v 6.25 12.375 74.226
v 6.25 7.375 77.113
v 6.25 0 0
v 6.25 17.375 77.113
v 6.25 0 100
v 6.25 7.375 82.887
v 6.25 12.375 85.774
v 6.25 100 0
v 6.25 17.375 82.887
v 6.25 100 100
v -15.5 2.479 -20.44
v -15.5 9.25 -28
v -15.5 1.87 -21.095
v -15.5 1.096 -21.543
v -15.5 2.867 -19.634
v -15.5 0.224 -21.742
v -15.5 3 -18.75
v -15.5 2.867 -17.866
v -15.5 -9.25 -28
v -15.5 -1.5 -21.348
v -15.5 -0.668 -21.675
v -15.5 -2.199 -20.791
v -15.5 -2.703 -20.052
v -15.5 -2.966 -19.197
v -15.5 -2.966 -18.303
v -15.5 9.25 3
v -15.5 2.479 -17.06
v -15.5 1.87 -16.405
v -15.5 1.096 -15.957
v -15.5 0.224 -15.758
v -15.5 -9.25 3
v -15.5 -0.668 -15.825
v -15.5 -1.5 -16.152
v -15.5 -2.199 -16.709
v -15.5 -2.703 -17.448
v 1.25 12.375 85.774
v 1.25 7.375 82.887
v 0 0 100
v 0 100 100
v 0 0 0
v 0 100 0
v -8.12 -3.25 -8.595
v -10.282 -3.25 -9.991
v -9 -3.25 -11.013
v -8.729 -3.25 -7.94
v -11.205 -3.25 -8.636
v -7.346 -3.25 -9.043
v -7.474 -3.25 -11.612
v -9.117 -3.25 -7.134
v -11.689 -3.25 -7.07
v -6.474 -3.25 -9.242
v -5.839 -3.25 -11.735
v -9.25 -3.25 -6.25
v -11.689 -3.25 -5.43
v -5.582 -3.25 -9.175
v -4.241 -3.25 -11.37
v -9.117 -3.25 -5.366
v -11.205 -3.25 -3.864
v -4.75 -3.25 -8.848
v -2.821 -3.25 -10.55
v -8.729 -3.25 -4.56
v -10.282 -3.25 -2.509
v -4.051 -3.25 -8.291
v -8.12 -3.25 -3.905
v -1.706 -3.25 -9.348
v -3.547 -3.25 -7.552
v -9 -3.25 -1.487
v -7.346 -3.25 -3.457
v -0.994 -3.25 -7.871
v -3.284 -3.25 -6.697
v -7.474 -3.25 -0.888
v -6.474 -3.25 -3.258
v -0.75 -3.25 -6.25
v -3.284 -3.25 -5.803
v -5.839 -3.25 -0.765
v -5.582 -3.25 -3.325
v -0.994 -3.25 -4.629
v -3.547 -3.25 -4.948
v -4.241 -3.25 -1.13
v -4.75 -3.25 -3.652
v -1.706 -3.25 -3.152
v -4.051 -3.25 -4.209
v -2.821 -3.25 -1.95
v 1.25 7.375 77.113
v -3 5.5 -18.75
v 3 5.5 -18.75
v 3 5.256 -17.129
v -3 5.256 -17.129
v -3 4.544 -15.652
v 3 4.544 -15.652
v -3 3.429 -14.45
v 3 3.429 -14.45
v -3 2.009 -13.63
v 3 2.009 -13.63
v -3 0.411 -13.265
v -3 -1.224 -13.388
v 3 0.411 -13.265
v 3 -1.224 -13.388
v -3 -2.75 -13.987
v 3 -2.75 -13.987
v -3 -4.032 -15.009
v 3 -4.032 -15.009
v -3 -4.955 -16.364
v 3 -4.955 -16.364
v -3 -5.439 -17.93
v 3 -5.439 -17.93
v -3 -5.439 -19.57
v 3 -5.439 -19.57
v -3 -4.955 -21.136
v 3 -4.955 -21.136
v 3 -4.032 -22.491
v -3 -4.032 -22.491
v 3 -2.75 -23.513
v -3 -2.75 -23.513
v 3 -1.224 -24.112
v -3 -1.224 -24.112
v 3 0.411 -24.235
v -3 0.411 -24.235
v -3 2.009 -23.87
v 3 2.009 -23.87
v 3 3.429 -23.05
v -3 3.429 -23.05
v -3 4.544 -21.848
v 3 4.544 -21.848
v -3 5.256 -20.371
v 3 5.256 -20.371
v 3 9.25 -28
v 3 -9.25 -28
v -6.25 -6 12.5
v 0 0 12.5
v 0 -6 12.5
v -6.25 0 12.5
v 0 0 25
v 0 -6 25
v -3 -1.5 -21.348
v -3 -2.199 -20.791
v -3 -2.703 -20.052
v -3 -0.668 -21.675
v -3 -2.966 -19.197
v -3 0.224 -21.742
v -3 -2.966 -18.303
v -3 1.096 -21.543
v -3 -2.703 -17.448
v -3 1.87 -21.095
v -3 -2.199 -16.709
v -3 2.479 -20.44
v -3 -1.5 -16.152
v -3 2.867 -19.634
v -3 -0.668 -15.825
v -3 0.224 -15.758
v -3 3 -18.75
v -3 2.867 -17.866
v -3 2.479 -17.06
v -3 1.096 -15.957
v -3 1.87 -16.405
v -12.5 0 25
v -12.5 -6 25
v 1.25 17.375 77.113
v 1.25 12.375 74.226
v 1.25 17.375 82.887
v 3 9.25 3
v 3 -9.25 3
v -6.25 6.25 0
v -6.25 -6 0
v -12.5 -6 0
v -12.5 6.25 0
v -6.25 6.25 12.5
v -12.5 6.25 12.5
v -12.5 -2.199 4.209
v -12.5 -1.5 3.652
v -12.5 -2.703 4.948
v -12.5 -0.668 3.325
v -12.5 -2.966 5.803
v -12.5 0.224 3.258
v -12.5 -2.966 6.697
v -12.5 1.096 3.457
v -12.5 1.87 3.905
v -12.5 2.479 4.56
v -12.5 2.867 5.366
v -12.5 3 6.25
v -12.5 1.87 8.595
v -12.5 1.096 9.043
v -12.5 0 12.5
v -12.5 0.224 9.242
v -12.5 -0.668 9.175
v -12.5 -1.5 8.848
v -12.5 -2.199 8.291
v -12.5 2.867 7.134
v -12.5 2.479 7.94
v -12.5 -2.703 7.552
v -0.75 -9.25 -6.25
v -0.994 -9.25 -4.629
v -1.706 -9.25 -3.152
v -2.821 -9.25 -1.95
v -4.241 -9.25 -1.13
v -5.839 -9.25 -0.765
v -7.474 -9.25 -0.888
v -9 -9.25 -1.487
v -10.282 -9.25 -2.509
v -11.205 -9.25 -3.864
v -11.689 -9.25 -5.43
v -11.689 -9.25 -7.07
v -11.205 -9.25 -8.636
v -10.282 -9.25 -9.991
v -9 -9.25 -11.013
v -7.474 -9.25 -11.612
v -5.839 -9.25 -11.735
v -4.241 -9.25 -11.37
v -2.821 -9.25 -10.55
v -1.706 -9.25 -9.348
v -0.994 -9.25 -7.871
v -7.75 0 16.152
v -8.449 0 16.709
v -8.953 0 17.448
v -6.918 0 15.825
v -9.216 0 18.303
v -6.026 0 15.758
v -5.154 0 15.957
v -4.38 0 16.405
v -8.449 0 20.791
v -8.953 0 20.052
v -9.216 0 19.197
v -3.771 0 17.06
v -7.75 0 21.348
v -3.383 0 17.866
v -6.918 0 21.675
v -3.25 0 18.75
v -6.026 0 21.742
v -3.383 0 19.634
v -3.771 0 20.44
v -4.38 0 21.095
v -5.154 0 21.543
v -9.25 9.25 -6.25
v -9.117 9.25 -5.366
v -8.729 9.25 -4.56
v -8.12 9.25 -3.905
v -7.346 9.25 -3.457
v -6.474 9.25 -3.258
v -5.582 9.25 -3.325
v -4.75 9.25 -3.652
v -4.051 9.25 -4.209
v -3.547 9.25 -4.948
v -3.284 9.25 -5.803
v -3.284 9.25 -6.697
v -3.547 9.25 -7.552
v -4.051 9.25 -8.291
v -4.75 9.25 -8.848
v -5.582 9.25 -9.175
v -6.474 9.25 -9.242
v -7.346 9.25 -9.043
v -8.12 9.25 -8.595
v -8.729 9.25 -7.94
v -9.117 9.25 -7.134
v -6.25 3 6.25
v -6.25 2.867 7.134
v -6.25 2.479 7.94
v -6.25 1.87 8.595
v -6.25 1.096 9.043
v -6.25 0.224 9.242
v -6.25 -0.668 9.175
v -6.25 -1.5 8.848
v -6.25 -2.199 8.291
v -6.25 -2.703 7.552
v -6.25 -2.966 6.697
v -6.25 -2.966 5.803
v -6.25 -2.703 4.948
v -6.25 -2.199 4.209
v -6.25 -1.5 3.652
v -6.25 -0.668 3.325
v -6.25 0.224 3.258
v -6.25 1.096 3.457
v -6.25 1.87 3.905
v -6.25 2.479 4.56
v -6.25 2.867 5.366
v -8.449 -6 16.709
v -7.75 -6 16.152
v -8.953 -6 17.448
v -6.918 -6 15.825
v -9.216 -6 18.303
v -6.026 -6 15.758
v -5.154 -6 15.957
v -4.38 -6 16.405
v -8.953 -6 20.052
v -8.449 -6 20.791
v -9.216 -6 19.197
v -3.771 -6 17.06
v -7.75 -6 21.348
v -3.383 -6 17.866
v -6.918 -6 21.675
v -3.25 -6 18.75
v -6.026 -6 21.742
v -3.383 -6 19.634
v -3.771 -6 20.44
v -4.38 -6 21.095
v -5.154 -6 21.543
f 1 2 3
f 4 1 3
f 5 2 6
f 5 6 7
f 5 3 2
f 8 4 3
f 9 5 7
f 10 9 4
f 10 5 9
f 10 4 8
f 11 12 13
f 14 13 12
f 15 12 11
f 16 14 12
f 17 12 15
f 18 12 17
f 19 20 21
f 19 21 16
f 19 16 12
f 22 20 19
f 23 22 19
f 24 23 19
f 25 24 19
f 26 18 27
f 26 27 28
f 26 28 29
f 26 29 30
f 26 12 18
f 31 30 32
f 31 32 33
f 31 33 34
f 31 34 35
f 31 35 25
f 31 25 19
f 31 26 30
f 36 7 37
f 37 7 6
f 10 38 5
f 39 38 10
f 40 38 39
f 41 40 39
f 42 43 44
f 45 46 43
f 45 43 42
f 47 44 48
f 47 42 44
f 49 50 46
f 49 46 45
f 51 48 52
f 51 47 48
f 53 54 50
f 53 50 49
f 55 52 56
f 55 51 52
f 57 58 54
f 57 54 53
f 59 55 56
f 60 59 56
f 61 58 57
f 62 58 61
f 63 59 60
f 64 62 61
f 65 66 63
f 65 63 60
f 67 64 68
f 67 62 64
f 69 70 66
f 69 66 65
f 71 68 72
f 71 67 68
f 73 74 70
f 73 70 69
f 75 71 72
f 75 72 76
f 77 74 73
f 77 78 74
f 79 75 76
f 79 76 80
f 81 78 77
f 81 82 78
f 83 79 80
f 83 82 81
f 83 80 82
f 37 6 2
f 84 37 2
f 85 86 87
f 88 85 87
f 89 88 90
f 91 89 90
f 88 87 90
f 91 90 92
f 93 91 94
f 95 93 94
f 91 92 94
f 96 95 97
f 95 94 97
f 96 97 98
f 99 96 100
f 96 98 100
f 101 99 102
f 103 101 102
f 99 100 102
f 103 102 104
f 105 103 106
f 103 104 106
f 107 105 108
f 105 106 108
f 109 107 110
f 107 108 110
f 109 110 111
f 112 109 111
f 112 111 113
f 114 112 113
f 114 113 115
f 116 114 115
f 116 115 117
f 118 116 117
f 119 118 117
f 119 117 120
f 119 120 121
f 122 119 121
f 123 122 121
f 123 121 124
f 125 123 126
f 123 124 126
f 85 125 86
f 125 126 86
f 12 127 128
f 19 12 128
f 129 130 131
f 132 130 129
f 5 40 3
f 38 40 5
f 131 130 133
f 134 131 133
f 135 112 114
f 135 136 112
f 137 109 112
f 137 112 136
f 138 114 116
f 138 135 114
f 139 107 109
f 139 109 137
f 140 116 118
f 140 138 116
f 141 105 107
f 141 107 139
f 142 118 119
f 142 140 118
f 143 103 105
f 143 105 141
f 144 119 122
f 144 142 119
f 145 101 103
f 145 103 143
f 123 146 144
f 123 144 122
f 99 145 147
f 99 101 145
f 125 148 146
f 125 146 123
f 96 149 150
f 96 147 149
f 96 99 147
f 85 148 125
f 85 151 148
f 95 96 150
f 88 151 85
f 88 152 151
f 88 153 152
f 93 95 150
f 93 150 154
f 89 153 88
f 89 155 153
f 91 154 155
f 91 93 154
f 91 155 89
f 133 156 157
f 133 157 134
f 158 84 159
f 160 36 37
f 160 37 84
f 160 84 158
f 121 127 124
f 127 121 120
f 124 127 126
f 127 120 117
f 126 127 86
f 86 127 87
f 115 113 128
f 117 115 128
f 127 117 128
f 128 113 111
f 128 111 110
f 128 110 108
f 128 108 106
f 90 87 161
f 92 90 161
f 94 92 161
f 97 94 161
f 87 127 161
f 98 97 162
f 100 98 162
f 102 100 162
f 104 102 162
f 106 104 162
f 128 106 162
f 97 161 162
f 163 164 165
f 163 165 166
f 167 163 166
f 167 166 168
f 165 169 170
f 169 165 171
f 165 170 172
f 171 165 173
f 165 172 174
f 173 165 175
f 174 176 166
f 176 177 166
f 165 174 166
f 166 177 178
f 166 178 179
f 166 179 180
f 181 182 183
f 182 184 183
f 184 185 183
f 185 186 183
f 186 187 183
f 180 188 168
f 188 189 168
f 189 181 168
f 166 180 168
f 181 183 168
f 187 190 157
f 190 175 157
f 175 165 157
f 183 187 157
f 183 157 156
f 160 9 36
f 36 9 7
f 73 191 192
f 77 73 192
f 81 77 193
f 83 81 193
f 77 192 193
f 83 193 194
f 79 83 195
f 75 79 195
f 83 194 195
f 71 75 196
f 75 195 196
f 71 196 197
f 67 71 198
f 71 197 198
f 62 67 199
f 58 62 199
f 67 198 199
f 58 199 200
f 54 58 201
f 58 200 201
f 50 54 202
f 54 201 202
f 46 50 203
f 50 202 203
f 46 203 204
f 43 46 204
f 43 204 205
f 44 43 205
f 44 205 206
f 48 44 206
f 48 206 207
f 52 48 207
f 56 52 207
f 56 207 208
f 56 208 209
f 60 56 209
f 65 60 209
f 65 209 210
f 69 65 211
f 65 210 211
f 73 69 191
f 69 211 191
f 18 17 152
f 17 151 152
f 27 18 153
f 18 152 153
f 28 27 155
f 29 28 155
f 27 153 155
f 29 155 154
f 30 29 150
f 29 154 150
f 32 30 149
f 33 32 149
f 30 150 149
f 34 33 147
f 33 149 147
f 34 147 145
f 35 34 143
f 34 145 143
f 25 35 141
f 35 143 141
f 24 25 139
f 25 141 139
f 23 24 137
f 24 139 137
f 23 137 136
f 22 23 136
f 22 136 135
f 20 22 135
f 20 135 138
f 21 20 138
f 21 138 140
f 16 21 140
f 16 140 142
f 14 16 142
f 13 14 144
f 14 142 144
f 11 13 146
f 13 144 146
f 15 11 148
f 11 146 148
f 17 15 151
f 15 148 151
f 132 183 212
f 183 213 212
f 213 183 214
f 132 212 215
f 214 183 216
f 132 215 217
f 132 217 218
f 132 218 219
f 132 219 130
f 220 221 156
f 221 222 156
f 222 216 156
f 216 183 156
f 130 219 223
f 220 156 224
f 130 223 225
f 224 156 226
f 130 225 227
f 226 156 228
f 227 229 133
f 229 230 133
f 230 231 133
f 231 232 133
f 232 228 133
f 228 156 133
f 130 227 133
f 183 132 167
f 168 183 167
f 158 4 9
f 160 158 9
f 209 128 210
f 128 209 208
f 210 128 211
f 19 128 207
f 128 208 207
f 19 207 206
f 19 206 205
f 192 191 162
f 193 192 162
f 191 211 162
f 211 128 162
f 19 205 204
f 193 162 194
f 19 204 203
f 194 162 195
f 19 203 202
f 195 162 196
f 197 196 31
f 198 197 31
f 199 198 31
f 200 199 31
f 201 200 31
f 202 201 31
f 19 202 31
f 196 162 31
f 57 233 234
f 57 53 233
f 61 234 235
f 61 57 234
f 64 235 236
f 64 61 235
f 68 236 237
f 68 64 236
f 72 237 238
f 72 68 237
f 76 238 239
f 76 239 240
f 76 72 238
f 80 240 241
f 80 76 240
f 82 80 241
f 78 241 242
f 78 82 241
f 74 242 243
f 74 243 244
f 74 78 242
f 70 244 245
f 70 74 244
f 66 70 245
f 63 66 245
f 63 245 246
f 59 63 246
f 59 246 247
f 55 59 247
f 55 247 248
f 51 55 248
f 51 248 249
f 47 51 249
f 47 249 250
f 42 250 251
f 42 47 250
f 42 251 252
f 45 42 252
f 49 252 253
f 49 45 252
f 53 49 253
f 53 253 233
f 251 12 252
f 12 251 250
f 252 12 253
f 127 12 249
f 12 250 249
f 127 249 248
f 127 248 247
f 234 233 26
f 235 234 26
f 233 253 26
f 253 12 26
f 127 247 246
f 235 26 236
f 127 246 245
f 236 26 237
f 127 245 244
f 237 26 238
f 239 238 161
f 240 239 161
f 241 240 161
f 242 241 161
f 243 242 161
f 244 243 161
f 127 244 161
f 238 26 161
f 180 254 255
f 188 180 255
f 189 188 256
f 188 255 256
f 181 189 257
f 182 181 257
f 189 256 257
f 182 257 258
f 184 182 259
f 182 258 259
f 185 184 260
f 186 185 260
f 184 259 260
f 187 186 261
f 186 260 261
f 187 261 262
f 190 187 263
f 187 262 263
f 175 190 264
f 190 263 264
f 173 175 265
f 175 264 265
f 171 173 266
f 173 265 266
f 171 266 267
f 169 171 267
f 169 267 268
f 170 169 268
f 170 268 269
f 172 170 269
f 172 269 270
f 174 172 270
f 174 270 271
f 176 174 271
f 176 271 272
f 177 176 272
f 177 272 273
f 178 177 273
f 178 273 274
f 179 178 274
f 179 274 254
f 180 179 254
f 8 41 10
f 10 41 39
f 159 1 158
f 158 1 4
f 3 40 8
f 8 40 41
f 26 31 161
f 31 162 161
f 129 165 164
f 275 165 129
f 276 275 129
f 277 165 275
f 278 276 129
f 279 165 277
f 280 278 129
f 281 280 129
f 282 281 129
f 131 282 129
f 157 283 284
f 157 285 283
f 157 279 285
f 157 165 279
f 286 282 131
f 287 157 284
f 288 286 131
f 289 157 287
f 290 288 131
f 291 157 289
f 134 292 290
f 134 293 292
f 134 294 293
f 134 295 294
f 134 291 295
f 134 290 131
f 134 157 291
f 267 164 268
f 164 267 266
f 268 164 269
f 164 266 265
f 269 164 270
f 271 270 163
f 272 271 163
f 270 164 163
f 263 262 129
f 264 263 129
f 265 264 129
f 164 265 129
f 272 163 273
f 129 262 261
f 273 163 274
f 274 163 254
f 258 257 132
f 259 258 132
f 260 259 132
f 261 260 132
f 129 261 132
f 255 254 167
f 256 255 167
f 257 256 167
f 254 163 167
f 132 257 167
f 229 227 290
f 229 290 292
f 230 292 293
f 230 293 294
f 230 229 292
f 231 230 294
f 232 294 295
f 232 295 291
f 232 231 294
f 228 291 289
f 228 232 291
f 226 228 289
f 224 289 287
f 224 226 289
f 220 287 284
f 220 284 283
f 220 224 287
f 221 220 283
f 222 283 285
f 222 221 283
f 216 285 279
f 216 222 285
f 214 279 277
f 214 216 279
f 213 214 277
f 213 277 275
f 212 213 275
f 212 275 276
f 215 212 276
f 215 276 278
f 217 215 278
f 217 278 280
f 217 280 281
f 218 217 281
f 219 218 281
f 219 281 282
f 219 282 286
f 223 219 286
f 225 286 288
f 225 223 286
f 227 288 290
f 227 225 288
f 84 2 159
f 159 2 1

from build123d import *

# Parameters (mm, degrees)
F0_W          = 12.5
F0_H          = 25
F0_R          = 3
F1_DEPTH      = 6
F3_START      = -6.25
F2_W          = 6.25
F2_H          = 12.5
F3_DEPTH      = 6.25
F4_W          = 6.25
F4_H          = 12.5
F5_DEPTH      = 25
F6_R          = 3
F7_DEPTH      = 25
F8_W          = 12.5
F8_H          = 25
F9_DEPTH      = 6.25
F9_DEPTH_BACK = 6.25
F10_R         = 3
F11_DEPTH     = 25
F12_R         = 3
F13_DEPTH     = 25
F14_DEPTH     = 3
F15_DEPTH     = 3
F16_DEPTH     = 3
F17_DEPTH     = 3
F18_DEPTH     = 3
F19_DEPTH     = 3
F20_R         = 5.5
F20_R_2       = 3
F21_DEPTH     = 6
F22_R         = 5.5
F22_R_2       = 3
F23_DEPTH     = 6
F24_W         = 100
F24_H         = 100
F25_DEPTH     = 6.25
F27_DEPTH     = 5


with BuildPart() as f1:
    # F0 (on Front) → F1 (new body)
    with BuildSketch(Plane.XZ):
        with Locations((-6.25, 12.5)):
            Rectangle(F0_W, F0_H)
        with Locations((-6.25, 18.75)):
            Circle(F0_R, mode=Mode.SUBTRACT)
    extrude(amount=F1_DEPTH)

    # F2 (on Right) → F3 (join)
    with BuildSketch(Plane.YZ.offset(F3_START)):
        with Locations((3.125, 6.25)):
            Rectangle(F2_W, F2_H)
    extrude(amount=-F3_DEPTH)

    # F4 (on face) → F5 (cut)
    with BuildSketch(Plane(origin=(0, 0, 0), x_dir=(-1, 0, 0), z_dir=(0, 1, 0))):
        with Locations((3.125, 6.25)):
            Rectangle(F4_W, F4_H)
    extrude(amount=-F5_DEPTH, mode=Mode.SUBTRACT)

    # F6 (on face) → F7 (cut)
    with BuildSketch(Plane.YZ.offset(-6.25)):
        with Locations((0, 6.25)):
            Circle(F6_R)
    extrude(amount=-F7_DEPTH, mode=Mode.SUBTRACT)


with BuildPart() as f9:
    # F8 (on Front) → F9 (new body, two sides)
    with BuildSketch(Plane.XZ) as f9_sk:
        with Locations((-6.25, -12.5)):
            Rectangle(F8_W, F8_H)
    extrude(amount=-F9_DEPTH)
    extrude(f9_sk.sketch, amount=F9_DEPTH_BACK)

    # F10 (on face) → F11 (cut)
    with BuildSketch(Plane(origin=(0, 6.25, 0), x_dir=(-1, 0, 0), z_dir=(0, 1, 0))):
        with Locations((6.25, -6.25)):
            Circle(F10_R)
    extrude(amount=-F11_DEPTH, mode=Mode.SUBTRACT)

    # F12 (on face) → F13 (cut)
    with BuildSketch(Plane.YZ):
        with Locations((0, -18.75)):
            Circle(F12_R)
    extrude(amount=-F13_DEPTH, mode=Mode.SUBTRACT)

    # F14 (add): a face of the model
    f14_faces = [f9.faces().sort_by_distance(p)[0] for p in [
        (-6.25, -6.25, -13.1217404261),
    ]]
    extrude(f14_faces, amount=F14_DEPTH)

    # F15 (add): a face of the model
    f15_faces = [f9.faces().sort_by_distance(p)[0] for p in [
        (-6.25, 6.25, -13.1217404261),
    ]]
    extrude(f15_faces, amount=F15_DEPTH)

    # F16 (add): a face of the model
    f16_faces = [f9.faces().sort_by_distance(p)[0] for p in [
        (0, 0, -12.0930351415),
    ]]
    extrude(f16_faces, amount=F16_DEPTH)

    # F17 (add): a face of the model
    f17_faces = [f9.faces().sort_by_distance(p)[0] for p in [
        (-12.5, 0, -12.0930351415),
    ]]
    extrude(f17_faces, amount=F17_DEPTH)

    # F18 (add): a face of the model
    f18_faces = [f9.faces().sort_by_distance(p)[0] for p in [
        (-6.25, 0, 0),
    ]]
    extrude(f18_faces, amount=F18_DEPTH)

    # F19 (add): a face of the model
    f19_faces = [f9.faces().sort_by_distance(p)[0] for p in [
        (-6.25, 0, -25),
    ]]
    extrude(f19_faces, amount=F19_DEPTH)

    # F20 (on face) → F21 (cut)
    with BuildSketch(Plane.YZ.offset(3)):
        with Locations((0, -18.75)):
            Circle(F20_R)
        with Locations((0, -18.75)):
            Circle(F20_R_2, mode=Mode.SUBTRACT)
    extrude(amount=-F21_DEPTH, mode=Mode.SUBTRACT)

    # F22 (on face) → F23 (cut)
    with BuildSketch(Plane.XZ.offset(9.25)):
        with Locations((-6.25, -6.25)):
            Circle(F22_R)
        with Locations((-6.25, -6.25)):
            Circle(F22_R_2, mode=Mode.SUBTRACT)
    extrude(amount=-F23_DEPTH, mode=Mode.SUBTRACT)


with BuildPart() as f25:
    # F24 (on Right) → F25 (new body)
    with BuildSketch(Plane.YZ):
        with Locations((50, 50)):
            Rectangle(F24_W, F24_H)
    extrude(amount=F25_DEPTH)

    # F26 (on face) → F27 (cut)
    with BuildSketch(Plane.YZ.offset(6.25)):
        Polygon((12.375, 74.2264973081), (17.375, 77.1132486541), (17.375, 82.8867513459), (12.375, 85.7735026919), (7.375, 82.8867513459), (7.375, 77.1132486541), align=None)
    extrude(amount=-F27_DEPTH, mode=Mode.SUBTRACT)


solid = Compound([f1.part, f9.part, f25.part])
